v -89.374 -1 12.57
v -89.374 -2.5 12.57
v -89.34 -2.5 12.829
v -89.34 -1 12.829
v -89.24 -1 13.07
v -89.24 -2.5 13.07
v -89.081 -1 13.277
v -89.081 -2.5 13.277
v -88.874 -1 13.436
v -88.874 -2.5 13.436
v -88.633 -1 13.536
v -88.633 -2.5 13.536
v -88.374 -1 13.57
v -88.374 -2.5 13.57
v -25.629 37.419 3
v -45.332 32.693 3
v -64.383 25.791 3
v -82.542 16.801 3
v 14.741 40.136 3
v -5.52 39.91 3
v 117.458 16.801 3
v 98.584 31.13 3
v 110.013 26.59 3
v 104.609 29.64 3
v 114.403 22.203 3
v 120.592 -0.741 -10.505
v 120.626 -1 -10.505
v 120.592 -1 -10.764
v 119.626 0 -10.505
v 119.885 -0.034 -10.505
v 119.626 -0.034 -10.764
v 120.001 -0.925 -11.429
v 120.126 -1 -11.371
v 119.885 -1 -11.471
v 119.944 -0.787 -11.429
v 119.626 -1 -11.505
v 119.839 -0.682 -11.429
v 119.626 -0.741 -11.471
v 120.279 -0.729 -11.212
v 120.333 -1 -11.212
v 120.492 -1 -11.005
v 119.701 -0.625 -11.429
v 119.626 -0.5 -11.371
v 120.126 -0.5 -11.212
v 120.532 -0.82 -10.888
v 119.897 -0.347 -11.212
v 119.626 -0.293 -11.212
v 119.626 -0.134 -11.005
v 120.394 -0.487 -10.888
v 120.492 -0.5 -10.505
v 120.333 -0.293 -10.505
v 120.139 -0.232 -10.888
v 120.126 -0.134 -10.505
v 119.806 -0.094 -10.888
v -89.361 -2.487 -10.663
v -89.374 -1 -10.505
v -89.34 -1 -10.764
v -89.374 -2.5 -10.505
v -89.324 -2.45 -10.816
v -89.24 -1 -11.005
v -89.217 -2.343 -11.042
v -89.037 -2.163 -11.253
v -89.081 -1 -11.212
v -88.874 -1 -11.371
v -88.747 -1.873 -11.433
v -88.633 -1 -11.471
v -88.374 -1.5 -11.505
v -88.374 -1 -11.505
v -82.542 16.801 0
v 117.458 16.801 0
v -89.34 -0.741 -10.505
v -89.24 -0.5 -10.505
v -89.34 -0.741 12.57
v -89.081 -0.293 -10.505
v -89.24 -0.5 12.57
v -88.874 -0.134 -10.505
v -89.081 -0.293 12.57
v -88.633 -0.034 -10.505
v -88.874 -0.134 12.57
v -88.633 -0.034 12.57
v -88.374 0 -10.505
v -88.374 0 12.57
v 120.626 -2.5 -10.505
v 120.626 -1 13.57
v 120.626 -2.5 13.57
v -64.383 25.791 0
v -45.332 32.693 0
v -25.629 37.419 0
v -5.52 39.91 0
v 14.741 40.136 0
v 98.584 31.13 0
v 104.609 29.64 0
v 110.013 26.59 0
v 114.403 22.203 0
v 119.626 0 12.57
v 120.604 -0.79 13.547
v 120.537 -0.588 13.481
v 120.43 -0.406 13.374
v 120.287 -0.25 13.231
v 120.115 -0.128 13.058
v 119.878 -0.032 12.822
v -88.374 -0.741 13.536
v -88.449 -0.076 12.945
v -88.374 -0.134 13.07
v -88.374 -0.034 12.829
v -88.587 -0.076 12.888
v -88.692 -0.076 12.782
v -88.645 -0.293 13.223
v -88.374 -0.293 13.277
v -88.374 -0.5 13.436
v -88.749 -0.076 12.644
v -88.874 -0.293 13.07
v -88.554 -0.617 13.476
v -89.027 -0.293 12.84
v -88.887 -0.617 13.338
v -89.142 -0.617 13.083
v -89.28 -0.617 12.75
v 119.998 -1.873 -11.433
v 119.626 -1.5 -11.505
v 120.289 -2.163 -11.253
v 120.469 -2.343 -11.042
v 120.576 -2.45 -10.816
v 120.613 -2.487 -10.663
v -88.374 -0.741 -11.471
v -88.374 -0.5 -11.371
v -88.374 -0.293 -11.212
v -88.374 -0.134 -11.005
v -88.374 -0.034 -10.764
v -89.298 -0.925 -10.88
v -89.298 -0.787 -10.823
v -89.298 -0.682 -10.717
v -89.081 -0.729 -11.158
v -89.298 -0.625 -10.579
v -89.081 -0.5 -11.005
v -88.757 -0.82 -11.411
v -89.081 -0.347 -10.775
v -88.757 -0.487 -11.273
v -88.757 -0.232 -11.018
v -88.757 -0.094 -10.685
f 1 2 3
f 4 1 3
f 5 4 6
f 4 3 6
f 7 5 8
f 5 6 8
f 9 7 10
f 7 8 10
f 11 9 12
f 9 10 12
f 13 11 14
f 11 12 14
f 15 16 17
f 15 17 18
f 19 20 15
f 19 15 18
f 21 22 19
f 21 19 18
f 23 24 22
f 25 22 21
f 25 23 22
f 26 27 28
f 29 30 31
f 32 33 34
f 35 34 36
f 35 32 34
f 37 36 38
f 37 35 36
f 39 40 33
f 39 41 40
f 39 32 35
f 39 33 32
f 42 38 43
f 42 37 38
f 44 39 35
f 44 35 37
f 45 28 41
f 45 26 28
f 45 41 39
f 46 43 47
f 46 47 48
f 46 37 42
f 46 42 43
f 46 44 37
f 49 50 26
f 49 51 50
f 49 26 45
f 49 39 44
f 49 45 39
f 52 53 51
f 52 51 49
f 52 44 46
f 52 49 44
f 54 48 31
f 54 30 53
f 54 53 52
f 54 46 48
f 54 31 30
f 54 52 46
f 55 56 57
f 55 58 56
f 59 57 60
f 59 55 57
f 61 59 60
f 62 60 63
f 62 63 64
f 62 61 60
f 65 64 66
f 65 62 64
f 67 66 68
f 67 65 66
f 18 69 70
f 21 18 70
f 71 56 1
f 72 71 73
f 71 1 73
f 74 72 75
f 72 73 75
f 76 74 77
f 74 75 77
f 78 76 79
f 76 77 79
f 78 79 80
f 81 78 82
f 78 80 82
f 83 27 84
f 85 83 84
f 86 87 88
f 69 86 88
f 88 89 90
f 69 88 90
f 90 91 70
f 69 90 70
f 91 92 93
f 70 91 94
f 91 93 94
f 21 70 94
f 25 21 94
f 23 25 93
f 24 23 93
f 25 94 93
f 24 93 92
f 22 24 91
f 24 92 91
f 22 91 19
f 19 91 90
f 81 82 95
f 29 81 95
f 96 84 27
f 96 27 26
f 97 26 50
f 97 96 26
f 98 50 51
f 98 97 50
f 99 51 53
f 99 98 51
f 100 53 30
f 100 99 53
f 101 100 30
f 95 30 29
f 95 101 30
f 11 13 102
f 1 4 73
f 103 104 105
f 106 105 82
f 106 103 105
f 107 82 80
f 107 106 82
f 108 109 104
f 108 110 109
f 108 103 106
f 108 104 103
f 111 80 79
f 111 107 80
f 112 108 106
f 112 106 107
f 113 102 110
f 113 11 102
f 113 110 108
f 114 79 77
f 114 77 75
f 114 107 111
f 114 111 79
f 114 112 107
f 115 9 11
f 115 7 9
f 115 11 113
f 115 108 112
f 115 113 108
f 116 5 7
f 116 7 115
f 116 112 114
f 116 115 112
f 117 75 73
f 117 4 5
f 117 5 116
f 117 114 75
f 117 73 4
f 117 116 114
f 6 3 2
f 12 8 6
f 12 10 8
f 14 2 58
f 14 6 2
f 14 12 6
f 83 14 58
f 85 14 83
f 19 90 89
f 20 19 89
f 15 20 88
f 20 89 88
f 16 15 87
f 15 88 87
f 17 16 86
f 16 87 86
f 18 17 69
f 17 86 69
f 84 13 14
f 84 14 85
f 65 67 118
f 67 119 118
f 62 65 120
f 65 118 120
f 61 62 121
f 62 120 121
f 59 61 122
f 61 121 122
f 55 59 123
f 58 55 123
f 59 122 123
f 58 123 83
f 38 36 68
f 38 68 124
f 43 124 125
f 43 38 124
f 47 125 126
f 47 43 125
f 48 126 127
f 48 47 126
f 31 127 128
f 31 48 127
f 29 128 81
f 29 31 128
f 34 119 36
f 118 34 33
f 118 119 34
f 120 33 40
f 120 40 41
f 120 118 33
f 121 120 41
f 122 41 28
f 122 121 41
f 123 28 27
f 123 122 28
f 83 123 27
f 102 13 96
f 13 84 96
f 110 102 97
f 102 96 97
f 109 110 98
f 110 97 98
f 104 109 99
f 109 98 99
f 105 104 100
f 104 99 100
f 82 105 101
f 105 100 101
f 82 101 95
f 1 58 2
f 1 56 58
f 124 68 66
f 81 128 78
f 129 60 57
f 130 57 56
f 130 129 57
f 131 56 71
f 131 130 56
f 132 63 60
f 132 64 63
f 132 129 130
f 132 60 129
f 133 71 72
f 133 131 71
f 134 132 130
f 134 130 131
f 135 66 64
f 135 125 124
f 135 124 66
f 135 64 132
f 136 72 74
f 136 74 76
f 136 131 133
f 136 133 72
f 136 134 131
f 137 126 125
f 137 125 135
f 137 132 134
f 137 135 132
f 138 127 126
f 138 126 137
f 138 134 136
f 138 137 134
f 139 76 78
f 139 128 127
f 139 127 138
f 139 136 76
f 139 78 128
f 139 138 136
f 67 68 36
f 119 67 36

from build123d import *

# Parameters (mm, degrees)
F1_DEPTH = 3
F2_W     = 210
F2_H     = 25.074628
F3_DEPTH = 2.5
F4_R     = 1


with BuildPart() as f1:
    # F0 (on Top) → F1 (new body)
    with BuildSketch(Plane.XY):
        with BuildLine():
            ThreePointArc((14.740672, 40.136269), (-35.546792, 35.331964), (-82.541718, 16.801251))
            Line((-82.541718, 16.801251), (117.458282, 16.801251))
            ThreePointArc((117.458282, 16.801251), (110.013252, 26.58952), (98.584343, 31.130305))
            Line((98.584343, 31.130305), (14.740672, 40.136269))
        make_face()
    extrude(amount=F1_DEPTH)


with BuildPart() as f3:
    # F2 (on Front) → F3 (new body)
    with BuildSketch(Plane.XZ):
        with Locations((15.625983, 1.032479)):
            Rectangle(F2_W, F2_H)
    extrude(amount=F3_DEPTH)

    # F4
    f4_edges = [f3.edges().sort_by_distance(p)[0] for p in [
        (-89.374017, -1.25, 13.569793),
        (15.625983, 0, 13.569793),
        (120.625983, 0, 1.032479),
        (120.625983, -1.25, -11.504835),
        (15.625983, 0, -11.504835),
        (15.625983, -2.5, -11.504835),
        (-89.374017, -1.25, -11.504835),
        (-89.374017, 0, 1.032479),
    ]]
    fillet(f4_edges, radius=F4_R)


solid = Compound([f1.part, f3.part])
